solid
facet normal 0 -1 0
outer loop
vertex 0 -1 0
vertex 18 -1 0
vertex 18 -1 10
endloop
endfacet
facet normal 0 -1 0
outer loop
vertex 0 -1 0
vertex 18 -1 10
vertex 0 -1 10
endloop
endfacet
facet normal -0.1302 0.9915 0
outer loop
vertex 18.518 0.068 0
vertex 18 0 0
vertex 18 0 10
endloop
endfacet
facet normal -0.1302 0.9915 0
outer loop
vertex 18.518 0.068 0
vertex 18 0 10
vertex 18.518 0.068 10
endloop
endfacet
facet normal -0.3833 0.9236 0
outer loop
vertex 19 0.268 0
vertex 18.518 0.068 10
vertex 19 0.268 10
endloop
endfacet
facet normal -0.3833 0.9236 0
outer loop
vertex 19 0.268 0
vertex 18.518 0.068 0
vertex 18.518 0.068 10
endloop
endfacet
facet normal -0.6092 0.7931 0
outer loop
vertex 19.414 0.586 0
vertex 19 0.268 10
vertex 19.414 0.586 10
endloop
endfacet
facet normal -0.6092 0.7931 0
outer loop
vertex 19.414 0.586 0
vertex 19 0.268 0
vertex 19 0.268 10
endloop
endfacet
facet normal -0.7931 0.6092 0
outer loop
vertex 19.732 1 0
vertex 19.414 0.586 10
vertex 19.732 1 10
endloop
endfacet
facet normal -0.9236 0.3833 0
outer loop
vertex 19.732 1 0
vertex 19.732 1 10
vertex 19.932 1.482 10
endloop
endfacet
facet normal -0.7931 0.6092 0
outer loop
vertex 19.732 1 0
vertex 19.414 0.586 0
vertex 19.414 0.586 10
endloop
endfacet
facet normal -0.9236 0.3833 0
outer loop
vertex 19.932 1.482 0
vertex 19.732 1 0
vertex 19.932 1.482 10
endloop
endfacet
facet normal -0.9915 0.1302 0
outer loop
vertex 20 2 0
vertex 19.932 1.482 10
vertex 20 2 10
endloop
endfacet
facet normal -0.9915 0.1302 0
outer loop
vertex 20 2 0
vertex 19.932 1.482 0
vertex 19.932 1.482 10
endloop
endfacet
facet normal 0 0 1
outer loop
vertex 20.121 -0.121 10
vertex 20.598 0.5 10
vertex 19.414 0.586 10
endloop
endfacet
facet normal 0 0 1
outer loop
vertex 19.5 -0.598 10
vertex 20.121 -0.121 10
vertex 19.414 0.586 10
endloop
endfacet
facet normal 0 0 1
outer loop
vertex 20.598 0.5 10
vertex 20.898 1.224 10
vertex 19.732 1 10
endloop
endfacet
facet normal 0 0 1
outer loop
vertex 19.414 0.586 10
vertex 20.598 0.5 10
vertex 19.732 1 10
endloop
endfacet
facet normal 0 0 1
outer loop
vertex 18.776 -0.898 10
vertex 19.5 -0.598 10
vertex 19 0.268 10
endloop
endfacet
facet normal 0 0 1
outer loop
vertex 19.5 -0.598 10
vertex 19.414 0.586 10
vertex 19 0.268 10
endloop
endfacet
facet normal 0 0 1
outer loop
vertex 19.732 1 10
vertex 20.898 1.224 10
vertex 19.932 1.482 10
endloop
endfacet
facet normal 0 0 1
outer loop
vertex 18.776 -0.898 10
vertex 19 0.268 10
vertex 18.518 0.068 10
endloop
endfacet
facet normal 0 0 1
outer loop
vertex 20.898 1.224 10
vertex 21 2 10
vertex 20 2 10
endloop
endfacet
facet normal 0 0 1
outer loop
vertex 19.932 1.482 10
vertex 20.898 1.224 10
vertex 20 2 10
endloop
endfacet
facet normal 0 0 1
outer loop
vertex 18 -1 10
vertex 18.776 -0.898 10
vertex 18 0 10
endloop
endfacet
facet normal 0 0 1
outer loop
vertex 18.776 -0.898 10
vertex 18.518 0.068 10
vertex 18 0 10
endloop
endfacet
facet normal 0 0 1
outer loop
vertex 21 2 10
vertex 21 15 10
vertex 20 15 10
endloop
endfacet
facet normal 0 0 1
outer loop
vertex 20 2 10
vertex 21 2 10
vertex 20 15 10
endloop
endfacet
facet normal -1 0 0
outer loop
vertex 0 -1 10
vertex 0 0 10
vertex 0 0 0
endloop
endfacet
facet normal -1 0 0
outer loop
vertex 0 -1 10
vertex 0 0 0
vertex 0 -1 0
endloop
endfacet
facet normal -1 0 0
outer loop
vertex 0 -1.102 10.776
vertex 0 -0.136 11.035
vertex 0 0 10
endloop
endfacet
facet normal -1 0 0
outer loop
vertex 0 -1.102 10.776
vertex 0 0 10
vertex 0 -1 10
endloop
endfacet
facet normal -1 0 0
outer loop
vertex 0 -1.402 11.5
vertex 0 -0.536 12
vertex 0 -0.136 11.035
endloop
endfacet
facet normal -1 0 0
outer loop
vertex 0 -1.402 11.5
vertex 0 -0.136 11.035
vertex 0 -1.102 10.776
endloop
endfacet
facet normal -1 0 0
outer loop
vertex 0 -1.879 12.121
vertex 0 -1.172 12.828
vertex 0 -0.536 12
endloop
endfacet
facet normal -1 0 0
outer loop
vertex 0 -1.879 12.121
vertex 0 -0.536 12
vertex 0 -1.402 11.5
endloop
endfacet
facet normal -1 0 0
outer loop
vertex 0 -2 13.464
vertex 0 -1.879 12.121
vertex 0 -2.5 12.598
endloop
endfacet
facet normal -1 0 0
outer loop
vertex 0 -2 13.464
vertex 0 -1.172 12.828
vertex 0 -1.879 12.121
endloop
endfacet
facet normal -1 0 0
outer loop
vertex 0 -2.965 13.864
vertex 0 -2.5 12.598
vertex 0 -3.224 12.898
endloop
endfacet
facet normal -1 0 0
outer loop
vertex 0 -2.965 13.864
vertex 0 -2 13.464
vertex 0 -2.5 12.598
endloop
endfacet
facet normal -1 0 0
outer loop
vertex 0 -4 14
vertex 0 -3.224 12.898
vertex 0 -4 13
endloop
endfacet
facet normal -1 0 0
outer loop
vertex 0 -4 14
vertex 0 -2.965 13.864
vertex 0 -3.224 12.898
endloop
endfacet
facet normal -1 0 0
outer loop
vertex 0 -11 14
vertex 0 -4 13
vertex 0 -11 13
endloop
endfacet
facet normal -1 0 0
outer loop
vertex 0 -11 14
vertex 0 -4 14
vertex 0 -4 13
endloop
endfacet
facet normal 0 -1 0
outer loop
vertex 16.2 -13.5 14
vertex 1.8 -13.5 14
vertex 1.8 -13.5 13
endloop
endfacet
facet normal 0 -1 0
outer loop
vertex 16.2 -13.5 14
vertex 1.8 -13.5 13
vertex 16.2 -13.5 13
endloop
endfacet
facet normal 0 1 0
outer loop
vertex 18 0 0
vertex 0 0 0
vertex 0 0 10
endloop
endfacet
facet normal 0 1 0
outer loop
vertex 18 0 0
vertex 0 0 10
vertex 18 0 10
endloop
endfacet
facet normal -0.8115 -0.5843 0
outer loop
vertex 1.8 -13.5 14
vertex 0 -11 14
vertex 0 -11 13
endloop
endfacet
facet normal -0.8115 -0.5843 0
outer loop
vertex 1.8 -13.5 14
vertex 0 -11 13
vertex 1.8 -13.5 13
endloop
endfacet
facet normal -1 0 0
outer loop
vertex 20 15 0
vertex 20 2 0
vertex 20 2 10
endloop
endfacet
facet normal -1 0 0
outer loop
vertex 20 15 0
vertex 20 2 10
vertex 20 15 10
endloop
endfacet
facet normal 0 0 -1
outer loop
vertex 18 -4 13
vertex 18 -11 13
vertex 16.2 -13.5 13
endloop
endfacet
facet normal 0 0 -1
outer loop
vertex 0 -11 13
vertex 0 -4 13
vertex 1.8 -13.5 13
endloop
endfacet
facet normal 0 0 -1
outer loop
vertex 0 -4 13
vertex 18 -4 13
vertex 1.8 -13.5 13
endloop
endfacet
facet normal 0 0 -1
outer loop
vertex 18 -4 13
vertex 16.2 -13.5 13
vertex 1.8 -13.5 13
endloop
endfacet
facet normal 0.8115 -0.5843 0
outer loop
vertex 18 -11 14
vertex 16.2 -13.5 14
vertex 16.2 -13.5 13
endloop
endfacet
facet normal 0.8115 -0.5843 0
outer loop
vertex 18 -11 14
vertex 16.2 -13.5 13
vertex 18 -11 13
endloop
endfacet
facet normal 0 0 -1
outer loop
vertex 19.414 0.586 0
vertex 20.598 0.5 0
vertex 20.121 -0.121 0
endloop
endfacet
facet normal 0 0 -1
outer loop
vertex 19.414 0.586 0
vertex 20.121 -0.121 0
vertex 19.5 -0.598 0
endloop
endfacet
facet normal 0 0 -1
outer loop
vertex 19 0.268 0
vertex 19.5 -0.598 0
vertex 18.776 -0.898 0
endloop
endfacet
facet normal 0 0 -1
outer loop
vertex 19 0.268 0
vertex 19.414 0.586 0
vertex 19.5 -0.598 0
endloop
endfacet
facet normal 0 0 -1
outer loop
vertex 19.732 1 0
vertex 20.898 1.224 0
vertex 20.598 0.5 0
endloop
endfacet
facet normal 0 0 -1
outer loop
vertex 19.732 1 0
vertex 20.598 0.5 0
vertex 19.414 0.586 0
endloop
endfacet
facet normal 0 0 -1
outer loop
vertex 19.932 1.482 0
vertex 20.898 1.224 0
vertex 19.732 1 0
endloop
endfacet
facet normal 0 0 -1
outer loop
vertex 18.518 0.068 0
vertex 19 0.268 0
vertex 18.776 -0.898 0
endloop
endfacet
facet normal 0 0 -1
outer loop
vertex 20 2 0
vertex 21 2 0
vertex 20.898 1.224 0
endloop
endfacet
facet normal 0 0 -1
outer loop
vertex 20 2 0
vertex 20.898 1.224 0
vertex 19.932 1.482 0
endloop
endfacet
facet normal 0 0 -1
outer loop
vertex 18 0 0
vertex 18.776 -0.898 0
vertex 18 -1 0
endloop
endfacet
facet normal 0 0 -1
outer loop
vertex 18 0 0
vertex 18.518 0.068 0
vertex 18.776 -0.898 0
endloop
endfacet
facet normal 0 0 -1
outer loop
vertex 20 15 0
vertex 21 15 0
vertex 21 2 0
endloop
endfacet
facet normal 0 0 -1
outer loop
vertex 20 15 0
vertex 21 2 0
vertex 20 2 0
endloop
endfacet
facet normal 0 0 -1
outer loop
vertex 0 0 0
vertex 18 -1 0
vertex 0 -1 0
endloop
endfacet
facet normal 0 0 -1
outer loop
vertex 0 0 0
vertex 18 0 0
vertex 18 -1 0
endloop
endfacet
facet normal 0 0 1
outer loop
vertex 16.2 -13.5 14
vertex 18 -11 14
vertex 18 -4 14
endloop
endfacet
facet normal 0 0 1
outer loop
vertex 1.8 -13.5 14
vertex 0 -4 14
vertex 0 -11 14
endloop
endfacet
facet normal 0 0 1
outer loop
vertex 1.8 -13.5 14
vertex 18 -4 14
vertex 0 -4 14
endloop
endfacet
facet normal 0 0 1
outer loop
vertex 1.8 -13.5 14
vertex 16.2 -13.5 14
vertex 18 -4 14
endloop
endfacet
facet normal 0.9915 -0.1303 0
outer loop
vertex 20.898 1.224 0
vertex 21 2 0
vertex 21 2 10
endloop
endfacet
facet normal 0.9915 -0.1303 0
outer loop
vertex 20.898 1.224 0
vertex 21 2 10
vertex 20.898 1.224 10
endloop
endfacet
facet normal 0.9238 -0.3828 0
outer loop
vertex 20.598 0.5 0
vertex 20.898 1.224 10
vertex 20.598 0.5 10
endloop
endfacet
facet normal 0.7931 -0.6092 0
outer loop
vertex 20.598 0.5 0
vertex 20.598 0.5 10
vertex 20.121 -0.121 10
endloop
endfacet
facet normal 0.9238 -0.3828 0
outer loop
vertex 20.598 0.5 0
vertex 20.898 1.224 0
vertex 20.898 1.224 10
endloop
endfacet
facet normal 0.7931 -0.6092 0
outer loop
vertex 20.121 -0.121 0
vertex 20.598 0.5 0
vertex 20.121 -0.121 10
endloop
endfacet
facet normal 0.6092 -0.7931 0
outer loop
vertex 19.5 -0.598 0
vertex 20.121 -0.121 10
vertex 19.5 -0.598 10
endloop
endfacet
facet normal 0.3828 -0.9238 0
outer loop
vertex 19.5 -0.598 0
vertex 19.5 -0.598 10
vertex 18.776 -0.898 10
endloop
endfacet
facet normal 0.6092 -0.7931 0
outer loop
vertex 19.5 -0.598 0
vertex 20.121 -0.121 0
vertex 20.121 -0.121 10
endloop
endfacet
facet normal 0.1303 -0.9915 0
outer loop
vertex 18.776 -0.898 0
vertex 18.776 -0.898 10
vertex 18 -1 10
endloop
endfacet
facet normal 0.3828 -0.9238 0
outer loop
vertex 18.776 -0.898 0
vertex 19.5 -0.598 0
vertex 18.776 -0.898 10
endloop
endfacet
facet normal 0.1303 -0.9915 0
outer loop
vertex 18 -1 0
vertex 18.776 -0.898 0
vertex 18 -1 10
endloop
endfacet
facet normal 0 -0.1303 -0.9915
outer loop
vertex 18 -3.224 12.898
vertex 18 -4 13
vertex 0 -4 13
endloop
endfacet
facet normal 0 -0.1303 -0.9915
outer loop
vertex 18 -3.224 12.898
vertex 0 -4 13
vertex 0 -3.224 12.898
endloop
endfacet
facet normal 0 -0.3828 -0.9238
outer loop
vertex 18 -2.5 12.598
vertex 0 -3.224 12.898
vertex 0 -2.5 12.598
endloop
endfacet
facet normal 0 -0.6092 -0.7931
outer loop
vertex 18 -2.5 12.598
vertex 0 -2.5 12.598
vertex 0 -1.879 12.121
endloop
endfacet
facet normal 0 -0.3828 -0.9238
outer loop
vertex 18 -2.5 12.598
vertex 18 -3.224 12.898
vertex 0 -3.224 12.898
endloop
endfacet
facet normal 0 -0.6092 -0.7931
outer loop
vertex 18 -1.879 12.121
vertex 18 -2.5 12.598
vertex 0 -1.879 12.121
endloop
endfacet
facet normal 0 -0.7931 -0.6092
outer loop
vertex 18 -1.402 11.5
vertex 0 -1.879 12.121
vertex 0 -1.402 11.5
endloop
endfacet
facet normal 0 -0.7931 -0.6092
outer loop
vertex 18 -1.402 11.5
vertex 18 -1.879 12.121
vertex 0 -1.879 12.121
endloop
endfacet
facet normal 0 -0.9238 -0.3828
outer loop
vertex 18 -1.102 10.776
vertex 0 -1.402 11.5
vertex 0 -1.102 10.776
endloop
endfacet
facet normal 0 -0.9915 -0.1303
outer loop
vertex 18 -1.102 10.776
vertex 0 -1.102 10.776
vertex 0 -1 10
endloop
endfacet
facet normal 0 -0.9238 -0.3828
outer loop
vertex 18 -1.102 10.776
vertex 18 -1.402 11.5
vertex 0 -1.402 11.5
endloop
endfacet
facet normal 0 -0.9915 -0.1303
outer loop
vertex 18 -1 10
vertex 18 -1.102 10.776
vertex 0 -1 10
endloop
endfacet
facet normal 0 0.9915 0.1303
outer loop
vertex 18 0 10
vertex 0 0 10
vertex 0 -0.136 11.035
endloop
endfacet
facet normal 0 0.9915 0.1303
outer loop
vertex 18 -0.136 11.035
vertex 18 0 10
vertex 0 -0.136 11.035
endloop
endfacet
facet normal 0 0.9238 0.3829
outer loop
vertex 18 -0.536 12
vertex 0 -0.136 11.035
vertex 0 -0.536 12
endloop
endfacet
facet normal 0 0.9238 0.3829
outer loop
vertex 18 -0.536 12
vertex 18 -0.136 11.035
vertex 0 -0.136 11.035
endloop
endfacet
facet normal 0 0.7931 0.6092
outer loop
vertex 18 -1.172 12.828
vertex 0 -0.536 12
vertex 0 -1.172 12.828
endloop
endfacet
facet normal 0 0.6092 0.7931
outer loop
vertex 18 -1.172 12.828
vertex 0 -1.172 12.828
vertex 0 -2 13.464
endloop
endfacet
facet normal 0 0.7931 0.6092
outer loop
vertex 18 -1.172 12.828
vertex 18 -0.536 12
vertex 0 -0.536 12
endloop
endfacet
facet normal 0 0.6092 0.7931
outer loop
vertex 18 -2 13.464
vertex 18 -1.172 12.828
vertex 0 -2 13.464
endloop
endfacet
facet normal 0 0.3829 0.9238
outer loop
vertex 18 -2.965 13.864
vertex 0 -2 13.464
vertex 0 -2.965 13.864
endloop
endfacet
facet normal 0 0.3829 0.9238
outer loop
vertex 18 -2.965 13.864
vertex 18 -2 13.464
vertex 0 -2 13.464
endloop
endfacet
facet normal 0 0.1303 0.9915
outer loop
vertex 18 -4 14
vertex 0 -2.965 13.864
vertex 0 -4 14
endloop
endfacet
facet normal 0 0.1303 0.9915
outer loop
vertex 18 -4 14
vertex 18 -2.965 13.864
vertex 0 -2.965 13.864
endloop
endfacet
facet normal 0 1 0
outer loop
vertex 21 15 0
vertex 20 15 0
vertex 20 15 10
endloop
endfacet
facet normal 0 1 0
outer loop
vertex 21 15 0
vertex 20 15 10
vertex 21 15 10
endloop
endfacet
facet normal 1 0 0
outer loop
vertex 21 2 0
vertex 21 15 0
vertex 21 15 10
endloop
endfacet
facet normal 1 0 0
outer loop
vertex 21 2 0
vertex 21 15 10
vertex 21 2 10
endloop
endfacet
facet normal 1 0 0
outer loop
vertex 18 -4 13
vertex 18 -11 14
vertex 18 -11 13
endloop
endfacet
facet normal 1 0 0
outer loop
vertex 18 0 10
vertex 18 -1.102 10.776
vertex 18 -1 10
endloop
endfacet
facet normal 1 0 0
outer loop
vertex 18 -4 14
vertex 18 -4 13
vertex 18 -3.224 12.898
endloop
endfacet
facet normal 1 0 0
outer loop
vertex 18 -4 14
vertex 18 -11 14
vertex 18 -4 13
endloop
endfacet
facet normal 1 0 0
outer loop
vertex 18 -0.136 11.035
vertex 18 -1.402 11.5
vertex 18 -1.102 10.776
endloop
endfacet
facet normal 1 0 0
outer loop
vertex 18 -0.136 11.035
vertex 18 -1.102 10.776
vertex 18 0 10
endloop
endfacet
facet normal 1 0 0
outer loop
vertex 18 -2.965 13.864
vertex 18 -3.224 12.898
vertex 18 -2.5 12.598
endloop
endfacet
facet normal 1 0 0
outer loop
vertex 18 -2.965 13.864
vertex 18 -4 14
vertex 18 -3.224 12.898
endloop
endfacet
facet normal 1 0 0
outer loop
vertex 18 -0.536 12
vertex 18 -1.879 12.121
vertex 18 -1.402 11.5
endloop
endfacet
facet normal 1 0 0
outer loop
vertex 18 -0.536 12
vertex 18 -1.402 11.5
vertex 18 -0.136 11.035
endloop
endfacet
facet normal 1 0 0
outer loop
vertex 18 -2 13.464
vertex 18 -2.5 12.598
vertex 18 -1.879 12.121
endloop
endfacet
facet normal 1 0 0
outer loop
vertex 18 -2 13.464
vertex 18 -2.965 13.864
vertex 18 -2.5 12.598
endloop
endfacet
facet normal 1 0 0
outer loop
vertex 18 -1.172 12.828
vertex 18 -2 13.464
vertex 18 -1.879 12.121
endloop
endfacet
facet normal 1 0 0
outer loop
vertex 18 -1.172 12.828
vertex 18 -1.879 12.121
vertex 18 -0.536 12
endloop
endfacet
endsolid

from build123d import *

# Parameters (mm, degrees)
SM_BASE_FLANGE_1_DEPTH      = 10
SM_EDGE_FLANGE_2_DEPTH      = 18
SM_START                    = 1
SM_EDGE_FLANGE_2_FLAT_DEPTH = 1


# Sheet-metal steps are written as plain solids
with BuildPart() as part:
    # Sketch 1 → 基体-法兰1 (new body)
    with BuildSketch(Plane.XY):
        with BuildLine():
            Line((0, 0), (18, 0))
            ThreePointArc((18, 0), (19.414213562, 0.585786438), (20, 2))
            Line((20, 2), (20, 15))
            Line((20, 15), (21, 15))
            Line((21, 15), (21, 2))
            ThreePointArc((21, 2), (20.121320344, -0.121320344), (18, -1))
            Line((18, -1), (0, -1))
            Line((0, -1), (0, 0))
        make_face()
    extrude(amount=SM_BASE_FLANGE_1_DEPTH)

    # 边线-法兰2 bend section (across the edge) → 边线-法兰2 (add)
    with BuildSketch(Plane(origin=(18, -1, 13), x_dir=(0, 0, -1), z_dir=(-1, 0, 0))):
        with BuildLine():
            Line((-1, 3), (0, 3))
            ThreePointArc((0, 3), (0.878679656, 0.878679656), (3, 0))
            Line((3, 0), (3, -1))
            ThreePointArc((3, -1), (0.171572875, 0.171572875), (-1, 3))
        make_face()
    extrude(amount=SM_EDGE_FLANGE_2_DEPTH)

    # 边线-法兰2 profile (on flange) → 边线-法兰2 flat (add)
    with BuildSketch(Plane(origin=(0, -1, 13), x_dir=(-1, 0, 0), z_dir=(0, 0, 1)).offset(SM_START)):
        Polygon((0, 3), (0, 10), (-1.8, 12.5), (-16.2, 12.5), (-18, 10), (-18, 3), align=None)
    extrude(amount=-SM_EDGE_FLANGE_2_FLAT_DEPTH)


solid = part.part
